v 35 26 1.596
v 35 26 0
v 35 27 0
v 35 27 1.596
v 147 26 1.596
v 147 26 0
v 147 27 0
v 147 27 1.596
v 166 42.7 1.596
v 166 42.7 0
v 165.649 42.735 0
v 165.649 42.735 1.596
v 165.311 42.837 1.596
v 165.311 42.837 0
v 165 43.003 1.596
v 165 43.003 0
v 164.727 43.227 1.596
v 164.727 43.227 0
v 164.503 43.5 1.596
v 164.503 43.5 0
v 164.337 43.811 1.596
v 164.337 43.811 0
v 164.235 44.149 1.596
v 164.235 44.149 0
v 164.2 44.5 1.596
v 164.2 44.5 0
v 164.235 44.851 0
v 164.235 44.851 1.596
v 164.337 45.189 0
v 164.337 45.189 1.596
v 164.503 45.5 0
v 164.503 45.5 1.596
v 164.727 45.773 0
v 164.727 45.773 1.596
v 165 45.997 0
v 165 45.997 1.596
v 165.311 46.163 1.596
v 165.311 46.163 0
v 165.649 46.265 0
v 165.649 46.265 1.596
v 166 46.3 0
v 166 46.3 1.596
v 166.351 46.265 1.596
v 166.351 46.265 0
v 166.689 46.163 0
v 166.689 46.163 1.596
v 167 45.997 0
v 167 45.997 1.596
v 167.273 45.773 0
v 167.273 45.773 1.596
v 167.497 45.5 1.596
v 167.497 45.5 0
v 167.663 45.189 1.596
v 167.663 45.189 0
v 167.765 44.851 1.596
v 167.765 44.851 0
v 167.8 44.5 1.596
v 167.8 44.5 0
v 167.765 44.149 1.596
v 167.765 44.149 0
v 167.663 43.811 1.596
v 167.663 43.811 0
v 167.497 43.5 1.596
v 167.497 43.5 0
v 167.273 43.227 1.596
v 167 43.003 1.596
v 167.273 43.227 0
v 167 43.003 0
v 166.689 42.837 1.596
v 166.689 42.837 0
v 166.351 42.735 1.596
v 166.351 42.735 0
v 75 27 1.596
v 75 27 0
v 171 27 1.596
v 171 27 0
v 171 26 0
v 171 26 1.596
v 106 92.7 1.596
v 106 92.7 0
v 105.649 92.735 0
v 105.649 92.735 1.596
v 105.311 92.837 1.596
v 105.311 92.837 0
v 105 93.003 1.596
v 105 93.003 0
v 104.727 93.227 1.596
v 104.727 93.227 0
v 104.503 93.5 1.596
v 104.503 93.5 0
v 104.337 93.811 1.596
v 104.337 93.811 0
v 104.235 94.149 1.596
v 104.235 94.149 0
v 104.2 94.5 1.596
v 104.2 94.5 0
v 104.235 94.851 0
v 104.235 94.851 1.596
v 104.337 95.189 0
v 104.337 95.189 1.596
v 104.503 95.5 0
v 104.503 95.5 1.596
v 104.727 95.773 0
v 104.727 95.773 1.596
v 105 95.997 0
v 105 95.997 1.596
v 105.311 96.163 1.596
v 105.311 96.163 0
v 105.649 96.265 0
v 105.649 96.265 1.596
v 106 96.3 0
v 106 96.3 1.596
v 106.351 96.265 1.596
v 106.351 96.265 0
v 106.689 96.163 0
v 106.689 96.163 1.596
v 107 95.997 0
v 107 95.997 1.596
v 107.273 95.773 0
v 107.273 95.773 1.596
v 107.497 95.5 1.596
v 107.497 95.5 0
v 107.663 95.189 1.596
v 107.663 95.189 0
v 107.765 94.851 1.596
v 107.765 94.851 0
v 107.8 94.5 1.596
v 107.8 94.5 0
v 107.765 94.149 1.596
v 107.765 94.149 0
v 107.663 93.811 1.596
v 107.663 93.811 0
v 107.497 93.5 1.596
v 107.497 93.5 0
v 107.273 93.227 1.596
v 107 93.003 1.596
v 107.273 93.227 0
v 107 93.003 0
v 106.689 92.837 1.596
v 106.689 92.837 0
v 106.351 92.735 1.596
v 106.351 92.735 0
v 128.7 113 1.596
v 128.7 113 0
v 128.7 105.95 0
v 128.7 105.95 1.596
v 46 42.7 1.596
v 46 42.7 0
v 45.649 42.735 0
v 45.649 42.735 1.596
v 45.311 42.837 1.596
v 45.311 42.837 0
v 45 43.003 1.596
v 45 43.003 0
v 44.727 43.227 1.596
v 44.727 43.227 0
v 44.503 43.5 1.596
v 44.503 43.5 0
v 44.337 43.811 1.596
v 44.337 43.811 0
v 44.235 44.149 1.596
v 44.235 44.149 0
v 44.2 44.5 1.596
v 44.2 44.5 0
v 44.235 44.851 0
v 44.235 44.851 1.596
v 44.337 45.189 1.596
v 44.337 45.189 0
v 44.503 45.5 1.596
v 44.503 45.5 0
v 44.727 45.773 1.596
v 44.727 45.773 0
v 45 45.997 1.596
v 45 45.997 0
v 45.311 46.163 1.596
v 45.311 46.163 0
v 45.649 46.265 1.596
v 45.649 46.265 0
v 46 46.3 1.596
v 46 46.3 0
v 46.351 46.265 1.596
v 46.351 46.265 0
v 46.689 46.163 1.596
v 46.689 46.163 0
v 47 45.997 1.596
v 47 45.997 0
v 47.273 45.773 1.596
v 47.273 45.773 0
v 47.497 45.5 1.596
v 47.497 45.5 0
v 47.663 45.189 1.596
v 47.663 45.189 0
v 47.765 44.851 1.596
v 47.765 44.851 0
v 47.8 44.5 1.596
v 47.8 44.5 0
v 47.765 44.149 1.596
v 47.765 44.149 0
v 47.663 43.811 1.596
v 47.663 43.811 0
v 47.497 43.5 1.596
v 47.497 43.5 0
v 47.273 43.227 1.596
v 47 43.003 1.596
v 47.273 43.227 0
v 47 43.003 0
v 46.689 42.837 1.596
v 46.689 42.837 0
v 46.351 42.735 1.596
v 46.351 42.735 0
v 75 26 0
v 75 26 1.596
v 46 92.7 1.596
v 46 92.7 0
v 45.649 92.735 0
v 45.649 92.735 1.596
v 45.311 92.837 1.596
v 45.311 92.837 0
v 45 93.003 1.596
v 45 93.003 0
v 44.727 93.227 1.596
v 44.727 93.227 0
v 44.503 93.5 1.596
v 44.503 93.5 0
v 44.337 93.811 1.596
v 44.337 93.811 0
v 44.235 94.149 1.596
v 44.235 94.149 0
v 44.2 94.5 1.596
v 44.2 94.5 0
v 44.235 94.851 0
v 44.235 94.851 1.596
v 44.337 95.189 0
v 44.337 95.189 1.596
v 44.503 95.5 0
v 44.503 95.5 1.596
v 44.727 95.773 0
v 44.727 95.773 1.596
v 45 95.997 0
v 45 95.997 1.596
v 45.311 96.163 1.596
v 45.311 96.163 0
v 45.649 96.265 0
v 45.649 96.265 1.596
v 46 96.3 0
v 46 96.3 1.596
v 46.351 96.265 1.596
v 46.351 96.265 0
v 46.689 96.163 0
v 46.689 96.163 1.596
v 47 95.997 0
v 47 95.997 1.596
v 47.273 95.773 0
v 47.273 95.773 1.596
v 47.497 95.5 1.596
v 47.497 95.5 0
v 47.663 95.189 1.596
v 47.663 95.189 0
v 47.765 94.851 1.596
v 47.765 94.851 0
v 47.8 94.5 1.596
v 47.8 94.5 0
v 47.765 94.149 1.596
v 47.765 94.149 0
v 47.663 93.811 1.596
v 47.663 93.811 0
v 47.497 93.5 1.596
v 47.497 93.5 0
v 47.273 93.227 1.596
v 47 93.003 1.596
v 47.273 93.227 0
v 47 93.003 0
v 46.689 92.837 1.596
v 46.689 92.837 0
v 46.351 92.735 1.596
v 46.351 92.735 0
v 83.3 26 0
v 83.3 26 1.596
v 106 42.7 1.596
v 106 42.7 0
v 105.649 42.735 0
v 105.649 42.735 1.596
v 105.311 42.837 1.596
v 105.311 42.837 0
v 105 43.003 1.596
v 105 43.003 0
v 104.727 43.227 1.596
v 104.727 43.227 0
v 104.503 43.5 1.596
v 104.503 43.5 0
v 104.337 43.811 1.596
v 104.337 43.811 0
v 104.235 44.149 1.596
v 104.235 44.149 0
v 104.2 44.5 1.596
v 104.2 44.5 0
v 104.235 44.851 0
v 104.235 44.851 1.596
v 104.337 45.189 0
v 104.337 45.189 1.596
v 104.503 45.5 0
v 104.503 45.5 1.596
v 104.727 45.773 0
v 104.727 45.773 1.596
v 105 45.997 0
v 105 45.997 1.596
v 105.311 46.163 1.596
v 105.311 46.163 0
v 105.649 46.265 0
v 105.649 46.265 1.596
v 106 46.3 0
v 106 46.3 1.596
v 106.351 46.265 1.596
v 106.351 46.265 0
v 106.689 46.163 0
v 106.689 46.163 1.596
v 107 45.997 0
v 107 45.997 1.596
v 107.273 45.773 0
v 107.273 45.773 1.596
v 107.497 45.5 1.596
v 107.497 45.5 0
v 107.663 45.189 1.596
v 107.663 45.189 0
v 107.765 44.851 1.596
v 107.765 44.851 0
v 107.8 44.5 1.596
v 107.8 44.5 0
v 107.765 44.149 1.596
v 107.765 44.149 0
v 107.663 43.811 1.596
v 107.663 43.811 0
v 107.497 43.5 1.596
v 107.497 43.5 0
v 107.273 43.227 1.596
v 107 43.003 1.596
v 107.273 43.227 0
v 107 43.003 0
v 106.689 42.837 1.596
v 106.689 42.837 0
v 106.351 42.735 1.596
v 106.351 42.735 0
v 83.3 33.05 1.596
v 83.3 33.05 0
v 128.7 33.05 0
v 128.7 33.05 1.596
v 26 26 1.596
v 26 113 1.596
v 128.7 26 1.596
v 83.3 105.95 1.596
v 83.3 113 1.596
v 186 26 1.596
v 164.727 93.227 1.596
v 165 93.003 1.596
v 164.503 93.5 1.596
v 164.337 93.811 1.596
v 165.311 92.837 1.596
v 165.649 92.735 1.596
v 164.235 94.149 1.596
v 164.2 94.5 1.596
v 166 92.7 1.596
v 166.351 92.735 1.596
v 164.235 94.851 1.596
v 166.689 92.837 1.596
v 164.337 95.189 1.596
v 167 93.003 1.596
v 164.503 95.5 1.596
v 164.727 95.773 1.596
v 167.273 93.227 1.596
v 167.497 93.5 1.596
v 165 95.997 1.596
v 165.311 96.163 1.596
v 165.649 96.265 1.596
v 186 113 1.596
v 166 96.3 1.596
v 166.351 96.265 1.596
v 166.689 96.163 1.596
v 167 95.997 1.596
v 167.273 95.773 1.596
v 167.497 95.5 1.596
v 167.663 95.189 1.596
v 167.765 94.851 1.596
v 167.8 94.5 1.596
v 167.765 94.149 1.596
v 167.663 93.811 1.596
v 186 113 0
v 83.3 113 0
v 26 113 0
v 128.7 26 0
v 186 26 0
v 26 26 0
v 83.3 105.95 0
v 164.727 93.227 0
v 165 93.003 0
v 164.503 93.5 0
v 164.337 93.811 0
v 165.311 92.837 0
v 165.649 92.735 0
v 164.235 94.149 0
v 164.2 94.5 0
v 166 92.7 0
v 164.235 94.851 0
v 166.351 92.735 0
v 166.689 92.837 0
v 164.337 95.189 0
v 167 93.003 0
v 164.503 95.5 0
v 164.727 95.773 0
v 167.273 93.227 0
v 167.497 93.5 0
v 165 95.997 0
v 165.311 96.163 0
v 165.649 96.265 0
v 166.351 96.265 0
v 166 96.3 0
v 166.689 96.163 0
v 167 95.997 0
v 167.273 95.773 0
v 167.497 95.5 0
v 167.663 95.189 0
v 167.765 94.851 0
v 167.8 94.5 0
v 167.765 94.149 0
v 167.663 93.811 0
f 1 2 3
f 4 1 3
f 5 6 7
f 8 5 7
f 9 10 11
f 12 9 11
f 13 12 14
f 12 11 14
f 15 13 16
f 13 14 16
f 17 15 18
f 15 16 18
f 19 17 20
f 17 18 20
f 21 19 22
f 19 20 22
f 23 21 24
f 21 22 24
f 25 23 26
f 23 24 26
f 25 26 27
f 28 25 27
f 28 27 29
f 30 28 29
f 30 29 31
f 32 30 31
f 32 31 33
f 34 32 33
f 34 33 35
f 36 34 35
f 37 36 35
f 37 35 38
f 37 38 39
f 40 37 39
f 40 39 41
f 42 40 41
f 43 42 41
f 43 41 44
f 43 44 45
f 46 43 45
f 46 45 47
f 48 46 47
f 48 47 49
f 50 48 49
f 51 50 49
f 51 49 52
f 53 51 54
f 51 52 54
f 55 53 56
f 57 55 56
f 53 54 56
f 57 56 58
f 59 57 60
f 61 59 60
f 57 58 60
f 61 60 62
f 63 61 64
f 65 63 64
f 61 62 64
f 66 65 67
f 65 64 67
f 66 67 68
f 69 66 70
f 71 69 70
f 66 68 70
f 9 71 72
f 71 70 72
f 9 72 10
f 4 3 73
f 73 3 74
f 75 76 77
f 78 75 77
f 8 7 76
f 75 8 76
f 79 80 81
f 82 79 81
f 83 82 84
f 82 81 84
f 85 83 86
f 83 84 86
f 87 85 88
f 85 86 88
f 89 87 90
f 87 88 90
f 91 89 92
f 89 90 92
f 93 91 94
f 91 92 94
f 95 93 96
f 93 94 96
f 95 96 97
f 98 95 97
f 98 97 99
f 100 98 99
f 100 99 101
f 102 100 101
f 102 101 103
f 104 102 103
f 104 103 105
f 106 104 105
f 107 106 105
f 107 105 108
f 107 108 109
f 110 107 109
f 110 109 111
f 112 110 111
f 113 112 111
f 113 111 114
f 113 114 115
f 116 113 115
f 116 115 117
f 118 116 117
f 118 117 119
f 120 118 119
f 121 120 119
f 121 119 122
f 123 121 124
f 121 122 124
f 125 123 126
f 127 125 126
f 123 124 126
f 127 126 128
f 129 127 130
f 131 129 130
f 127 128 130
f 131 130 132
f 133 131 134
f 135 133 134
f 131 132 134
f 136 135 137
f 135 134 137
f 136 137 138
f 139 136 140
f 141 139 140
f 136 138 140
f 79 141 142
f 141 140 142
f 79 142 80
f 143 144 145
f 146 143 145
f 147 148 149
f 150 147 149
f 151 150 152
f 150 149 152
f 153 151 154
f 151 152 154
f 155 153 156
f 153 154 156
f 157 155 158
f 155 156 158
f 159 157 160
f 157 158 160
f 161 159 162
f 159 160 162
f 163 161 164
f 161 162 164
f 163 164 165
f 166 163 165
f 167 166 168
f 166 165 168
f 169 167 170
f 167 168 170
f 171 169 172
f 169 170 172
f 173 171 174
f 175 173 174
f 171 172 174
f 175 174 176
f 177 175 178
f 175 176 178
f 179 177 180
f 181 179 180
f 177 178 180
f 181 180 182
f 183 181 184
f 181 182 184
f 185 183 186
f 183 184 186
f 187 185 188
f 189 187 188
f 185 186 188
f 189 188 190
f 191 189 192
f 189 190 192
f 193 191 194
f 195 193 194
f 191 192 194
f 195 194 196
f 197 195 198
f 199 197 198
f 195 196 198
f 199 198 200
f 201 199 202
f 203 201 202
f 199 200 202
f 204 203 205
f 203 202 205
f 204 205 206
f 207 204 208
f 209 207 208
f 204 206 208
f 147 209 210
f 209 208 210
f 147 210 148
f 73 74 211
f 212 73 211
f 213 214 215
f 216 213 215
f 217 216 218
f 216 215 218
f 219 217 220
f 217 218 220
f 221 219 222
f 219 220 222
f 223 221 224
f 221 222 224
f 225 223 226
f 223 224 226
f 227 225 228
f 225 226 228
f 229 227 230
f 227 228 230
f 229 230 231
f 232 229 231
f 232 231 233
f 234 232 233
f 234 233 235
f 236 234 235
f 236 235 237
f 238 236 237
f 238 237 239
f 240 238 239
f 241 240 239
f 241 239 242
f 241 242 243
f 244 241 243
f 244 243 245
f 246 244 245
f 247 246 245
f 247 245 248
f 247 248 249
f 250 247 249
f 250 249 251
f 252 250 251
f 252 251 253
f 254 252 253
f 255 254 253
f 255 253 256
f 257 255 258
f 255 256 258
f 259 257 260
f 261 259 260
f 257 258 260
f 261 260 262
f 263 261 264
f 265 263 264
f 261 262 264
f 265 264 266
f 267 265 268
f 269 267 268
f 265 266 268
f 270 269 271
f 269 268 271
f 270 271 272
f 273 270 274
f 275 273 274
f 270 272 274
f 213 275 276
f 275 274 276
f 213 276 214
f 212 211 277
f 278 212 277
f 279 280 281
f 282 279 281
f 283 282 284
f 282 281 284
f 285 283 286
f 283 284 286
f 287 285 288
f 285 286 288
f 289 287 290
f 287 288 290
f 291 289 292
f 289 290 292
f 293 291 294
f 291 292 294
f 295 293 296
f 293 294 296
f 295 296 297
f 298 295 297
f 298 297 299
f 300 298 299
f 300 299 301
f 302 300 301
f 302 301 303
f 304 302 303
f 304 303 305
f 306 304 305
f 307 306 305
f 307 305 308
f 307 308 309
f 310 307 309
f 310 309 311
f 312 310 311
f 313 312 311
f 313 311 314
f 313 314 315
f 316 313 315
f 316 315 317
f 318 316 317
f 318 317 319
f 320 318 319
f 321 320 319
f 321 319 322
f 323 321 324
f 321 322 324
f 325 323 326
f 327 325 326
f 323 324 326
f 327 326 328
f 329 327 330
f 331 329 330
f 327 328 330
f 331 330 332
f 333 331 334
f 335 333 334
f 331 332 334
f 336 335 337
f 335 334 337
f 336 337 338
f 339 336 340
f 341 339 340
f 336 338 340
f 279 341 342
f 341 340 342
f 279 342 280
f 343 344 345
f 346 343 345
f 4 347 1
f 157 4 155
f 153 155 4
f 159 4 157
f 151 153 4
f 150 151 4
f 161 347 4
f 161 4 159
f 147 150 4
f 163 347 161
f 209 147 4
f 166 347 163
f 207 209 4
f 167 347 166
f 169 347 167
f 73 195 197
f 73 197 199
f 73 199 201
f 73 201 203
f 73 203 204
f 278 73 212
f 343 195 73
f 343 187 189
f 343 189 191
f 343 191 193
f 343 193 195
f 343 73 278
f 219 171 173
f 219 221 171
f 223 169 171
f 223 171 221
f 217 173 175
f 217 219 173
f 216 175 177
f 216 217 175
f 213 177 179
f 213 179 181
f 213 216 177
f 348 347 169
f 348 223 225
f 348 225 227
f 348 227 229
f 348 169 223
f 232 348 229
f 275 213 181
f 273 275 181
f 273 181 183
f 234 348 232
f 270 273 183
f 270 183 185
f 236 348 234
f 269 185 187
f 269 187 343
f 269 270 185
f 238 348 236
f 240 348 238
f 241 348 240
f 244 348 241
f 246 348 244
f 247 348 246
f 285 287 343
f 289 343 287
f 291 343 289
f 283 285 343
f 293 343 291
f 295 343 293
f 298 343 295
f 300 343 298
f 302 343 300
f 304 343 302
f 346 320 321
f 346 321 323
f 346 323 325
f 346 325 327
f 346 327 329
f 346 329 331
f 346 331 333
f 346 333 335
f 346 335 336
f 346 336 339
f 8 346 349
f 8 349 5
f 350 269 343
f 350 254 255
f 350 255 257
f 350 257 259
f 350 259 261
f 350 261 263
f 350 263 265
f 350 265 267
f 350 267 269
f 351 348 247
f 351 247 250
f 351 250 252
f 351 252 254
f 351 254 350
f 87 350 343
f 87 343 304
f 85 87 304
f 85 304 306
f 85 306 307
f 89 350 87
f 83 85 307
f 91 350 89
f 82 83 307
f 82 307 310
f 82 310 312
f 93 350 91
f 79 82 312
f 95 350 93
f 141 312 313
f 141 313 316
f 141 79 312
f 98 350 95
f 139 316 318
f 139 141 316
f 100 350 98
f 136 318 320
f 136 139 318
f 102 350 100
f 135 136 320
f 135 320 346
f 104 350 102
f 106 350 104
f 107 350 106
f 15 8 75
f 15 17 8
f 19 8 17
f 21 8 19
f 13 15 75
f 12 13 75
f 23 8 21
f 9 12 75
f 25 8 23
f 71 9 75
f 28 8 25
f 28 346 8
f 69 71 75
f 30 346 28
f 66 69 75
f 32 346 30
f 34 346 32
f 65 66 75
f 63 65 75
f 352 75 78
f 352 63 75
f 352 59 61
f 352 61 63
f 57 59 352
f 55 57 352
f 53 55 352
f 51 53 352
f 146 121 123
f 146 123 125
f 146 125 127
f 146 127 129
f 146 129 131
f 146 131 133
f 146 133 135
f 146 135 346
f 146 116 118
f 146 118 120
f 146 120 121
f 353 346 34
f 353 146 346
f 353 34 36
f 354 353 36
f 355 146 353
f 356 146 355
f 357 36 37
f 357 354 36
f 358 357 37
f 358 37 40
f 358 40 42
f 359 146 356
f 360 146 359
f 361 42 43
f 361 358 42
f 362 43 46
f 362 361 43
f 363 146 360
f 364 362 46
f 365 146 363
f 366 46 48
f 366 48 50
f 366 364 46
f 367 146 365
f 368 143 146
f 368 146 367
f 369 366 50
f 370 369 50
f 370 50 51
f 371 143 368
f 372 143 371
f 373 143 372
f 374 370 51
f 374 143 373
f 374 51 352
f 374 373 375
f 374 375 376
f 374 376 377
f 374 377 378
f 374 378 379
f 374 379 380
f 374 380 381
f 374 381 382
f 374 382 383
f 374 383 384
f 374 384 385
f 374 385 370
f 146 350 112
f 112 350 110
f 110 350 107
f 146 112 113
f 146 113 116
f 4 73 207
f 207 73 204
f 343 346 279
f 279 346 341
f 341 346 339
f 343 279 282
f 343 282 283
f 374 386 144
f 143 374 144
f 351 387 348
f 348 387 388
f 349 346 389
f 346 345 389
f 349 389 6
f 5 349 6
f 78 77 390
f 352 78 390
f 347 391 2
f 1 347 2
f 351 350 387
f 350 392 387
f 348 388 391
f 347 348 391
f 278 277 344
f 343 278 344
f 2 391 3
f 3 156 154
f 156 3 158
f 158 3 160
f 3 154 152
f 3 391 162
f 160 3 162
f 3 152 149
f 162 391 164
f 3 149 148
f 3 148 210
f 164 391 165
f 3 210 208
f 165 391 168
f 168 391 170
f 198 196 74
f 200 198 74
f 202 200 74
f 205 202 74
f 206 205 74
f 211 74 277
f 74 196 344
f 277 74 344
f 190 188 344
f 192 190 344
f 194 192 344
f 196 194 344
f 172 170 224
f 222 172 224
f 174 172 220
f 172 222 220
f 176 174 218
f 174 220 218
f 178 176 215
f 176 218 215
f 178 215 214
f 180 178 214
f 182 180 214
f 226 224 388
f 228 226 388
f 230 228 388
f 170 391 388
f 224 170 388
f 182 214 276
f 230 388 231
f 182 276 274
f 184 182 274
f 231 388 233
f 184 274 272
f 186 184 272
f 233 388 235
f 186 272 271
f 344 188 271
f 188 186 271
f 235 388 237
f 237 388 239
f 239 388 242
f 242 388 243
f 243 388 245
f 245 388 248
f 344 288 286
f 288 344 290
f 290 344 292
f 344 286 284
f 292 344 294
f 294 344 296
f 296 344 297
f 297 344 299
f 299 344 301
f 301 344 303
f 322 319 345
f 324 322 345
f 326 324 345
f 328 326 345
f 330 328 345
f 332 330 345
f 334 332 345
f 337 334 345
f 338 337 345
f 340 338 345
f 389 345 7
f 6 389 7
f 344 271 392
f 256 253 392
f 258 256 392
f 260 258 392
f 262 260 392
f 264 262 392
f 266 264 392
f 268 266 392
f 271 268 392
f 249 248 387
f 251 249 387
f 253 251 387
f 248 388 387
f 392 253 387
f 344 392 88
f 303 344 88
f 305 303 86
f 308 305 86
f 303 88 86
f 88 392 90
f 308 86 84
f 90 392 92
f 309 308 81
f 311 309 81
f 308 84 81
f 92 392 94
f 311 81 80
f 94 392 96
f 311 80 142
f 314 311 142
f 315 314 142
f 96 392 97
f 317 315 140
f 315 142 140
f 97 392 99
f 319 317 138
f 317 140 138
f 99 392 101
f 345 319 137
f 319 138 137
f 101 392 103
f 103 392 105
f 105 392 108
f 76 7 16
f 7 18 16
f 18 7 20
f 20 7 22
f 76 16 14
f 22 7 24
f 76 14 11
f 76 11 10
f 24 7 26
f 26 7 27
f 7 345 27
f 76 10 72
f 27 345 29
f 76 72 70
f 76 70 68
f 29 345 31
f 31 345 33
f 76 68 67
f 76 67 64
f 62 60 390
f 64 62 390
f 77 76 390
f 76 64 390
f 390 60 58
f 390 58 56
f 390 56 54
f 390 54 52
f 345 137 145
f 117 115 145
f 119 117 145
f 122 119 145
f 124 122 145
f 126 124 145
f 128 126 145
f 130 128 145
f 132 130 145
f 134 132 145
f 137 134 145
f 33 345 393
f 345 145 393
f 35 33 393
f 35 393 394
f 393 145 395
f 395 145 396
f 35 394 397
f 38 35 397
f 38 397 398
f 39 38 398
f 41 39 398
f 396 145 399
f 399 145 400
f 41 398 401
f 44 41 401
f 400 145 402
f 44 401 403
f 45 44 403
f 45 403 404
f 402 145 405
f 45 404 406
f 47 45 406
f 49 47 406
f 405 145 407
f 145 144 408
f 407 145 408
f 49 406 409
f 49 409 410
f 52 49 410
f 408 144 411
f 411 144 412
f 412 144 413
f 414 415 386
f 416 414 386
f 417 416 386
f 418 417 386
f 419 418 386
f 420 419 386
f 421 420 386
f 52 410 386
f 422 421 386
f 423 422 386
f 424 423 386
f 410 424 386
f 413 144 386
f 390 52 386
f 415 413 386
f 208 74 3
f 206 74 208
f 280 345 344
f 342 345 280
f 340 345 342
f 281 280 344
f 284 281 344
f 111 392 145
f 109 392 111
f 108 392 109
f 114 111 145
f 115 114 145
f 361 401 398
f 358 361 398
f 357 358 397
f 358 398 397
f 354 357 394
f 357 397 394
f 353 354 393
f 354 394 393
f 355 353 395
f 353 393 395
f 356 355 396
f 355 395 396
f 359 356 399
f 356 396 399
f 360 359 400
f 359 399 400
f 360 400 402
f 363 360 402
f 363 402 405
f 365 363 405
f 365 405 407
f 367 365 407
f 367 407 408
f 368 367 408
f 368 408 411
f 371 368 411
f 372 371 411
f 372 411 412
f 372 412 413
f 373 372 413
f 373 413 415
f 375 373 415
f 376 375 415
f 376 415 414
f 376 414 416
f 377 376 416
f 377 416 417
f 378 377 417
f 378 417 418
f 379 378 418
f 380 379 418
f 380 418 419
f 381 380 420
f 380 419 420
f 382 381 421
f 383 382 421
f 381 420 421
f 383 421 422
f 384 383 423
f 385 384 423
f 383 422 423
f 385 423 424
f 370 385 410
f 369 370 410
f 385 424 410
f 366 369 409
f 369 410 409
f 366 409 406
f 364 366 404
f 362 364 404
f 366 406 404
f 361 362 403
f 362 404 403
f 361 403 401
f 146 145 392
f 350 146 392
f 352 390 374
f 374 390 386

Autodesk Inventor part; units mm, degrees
ref_plane "YZ Plane" through (0, 0, 0) normal (1, 0, 0) x (0, 1, 0)
ref_plane "XZ Plane" through (0, 0, 0) normal (0, 1, 0) x (-1, 0, 0)
ref_plane "BoardFrontPlane" through (0, 0, 0) normal (0, 0, 1) x (1, 0, 0)
sketch "Sketch1" plane through (0, 0, 0) normal (0, 0, 1) x (1, 0, 0)
  line L0 (35, 26) -> (35, 27)
  line L1 (35, 27) -> (75, 27)
  line L2 (75, 27) -> (75, 26)
  line L3 (75, 26) -> (83.3, 26)
  line L4 (83.3, 26) -> (83.3, 33.05)
  line L5 (83.3, 33.05) -> (128.7, 33.05)
  line L6 (128.7, 33.05) -> (128.7, 26)
  line L7 (128.7, 26) -> (147, 26)
  line L8 (147, 26) -> (147, 27)
  line L9 (147, 27) -> (171, 27)
  line L10 (171, 27) -> (171, 26)
  line L11 (171, 26) -> (186, 26)
  line L12 (186, 26) -> (186, 113)
  line L13 (186, 113) -> (128.7, 113)
  line L14 (128.7, 113) -> (128.7, 105.95)
  line L15 (128.7, 105.95) -> (83.3, 105.95)
  line L16 (83.3, 105.95) -> (83.3, 113)
  line L17 (83.3, 113) -> (26, 113)
  line L18 (26, 113) -> (26, 26)
  line L19 (26, 26) -> (35, 26)
extrude "BoardOutline" add sketch "Sketch1" along normal blind 1.5957
ref_plane "Work Plane2" through (106, 26, 0) normal (1, 0, 0) x (0, 0, -1)
ref_plane "Work Plane3" through (171, 69.5, 0) normal (0, -1, 0) x (1, 0, 0)
sketch "Sketch4" plane through (0, 0, 1.5957) normal (0, 0, 1) x (1, 0, 0)
  line L0 (83.3, 26) -> (83.3, 33.05)
  line L1 (83.3, 33.05) -> (128.7, 33.05)
  line L2 (128.7, 33.05) -> (128.7, 26)
  line L3 (26, 113) -> (26, 26) projected
  line L4 (83.3, 26) -> (128.7, 26)
  point P0 (83.3, 29.525)
  point P1 (186, 26)
  dimension "d9" = 57.3
  dimension "d10" = 57.3
  dimension "d11" = 7.05
sketch "Sketch8" plane through (0, 0, 1.5957) normal (0, 0, 1) x (1, 0, 0)
  point P0 (106, 94.5)
hole "Free-Hole1_1" at (106, 94.5, 1.5957) direction (0, 0, -1) diameter 3.6 end through all
sketch "Sketch9" plane through (0, 0, 1.5957) normal (0, 0, 1) x (1, 0, 0)
  point P0 (106, 44.5)
hole "Free-Hole1_2_1" at (106, 44.5, 1.5957) direction (0, 0, -1) diameter 3.6 end through all
sketch "Sketch11" plane through (0, 0, 1.5957) normal (0, 0, 1) x (1, 0, 0)
  point P0 (46, 94.5)
hole "Free-Hole4_1" at (46, 94.5, 1.5957) direction (0, 0, -1) diameter 3.6 end through all
sketch "Sketch12" plane through (0, 0, 1.5957) normal (0, 0, 1) x (1, 0, 0)
  point P0 (46, 44.5)
hole "Free-Hole4_2_1" at (46, 44.5, 1.5957) direction (0, 0, -1) diameter 3.6 end through all
sketch "Sketch13" plane through (0, 0, 1.5957) normal (0, 0, 1) x (1, 0, 0)
  point P0 (166, 44.5)
hole "Free-Hole4_3_1" at (166, 44.5, 1.5957) direction (0, 0, -1) diameter 3.6 end through all
sketch "Sketch14" plane through (0, 0, 1.5957) normal (0, 0, 1) x (1, 0, 0)
  point P0 (166, 94.5)
hole "Free-Hole4_4_1" at (166, 94.5, 1.5957) direction (0, 0, -1) diameter 3.6 end through all
sketch "img_Top" plane through (0, 0, 1.5957) normal (0, 0, 1) x (1, 0, 0)
  line L0 (26, 113) -> (186, 113) construction
  line L1 (186, 113) -> (186, 26.0021) construction
  line L2 (186, 26.0021) -> (26, 26.0021) construction
  line L3 (26, 26.0021) -> (26, 113) construction
decal "Decal_Top"
properties part number "ledbrick_plus_led_BOARD"
